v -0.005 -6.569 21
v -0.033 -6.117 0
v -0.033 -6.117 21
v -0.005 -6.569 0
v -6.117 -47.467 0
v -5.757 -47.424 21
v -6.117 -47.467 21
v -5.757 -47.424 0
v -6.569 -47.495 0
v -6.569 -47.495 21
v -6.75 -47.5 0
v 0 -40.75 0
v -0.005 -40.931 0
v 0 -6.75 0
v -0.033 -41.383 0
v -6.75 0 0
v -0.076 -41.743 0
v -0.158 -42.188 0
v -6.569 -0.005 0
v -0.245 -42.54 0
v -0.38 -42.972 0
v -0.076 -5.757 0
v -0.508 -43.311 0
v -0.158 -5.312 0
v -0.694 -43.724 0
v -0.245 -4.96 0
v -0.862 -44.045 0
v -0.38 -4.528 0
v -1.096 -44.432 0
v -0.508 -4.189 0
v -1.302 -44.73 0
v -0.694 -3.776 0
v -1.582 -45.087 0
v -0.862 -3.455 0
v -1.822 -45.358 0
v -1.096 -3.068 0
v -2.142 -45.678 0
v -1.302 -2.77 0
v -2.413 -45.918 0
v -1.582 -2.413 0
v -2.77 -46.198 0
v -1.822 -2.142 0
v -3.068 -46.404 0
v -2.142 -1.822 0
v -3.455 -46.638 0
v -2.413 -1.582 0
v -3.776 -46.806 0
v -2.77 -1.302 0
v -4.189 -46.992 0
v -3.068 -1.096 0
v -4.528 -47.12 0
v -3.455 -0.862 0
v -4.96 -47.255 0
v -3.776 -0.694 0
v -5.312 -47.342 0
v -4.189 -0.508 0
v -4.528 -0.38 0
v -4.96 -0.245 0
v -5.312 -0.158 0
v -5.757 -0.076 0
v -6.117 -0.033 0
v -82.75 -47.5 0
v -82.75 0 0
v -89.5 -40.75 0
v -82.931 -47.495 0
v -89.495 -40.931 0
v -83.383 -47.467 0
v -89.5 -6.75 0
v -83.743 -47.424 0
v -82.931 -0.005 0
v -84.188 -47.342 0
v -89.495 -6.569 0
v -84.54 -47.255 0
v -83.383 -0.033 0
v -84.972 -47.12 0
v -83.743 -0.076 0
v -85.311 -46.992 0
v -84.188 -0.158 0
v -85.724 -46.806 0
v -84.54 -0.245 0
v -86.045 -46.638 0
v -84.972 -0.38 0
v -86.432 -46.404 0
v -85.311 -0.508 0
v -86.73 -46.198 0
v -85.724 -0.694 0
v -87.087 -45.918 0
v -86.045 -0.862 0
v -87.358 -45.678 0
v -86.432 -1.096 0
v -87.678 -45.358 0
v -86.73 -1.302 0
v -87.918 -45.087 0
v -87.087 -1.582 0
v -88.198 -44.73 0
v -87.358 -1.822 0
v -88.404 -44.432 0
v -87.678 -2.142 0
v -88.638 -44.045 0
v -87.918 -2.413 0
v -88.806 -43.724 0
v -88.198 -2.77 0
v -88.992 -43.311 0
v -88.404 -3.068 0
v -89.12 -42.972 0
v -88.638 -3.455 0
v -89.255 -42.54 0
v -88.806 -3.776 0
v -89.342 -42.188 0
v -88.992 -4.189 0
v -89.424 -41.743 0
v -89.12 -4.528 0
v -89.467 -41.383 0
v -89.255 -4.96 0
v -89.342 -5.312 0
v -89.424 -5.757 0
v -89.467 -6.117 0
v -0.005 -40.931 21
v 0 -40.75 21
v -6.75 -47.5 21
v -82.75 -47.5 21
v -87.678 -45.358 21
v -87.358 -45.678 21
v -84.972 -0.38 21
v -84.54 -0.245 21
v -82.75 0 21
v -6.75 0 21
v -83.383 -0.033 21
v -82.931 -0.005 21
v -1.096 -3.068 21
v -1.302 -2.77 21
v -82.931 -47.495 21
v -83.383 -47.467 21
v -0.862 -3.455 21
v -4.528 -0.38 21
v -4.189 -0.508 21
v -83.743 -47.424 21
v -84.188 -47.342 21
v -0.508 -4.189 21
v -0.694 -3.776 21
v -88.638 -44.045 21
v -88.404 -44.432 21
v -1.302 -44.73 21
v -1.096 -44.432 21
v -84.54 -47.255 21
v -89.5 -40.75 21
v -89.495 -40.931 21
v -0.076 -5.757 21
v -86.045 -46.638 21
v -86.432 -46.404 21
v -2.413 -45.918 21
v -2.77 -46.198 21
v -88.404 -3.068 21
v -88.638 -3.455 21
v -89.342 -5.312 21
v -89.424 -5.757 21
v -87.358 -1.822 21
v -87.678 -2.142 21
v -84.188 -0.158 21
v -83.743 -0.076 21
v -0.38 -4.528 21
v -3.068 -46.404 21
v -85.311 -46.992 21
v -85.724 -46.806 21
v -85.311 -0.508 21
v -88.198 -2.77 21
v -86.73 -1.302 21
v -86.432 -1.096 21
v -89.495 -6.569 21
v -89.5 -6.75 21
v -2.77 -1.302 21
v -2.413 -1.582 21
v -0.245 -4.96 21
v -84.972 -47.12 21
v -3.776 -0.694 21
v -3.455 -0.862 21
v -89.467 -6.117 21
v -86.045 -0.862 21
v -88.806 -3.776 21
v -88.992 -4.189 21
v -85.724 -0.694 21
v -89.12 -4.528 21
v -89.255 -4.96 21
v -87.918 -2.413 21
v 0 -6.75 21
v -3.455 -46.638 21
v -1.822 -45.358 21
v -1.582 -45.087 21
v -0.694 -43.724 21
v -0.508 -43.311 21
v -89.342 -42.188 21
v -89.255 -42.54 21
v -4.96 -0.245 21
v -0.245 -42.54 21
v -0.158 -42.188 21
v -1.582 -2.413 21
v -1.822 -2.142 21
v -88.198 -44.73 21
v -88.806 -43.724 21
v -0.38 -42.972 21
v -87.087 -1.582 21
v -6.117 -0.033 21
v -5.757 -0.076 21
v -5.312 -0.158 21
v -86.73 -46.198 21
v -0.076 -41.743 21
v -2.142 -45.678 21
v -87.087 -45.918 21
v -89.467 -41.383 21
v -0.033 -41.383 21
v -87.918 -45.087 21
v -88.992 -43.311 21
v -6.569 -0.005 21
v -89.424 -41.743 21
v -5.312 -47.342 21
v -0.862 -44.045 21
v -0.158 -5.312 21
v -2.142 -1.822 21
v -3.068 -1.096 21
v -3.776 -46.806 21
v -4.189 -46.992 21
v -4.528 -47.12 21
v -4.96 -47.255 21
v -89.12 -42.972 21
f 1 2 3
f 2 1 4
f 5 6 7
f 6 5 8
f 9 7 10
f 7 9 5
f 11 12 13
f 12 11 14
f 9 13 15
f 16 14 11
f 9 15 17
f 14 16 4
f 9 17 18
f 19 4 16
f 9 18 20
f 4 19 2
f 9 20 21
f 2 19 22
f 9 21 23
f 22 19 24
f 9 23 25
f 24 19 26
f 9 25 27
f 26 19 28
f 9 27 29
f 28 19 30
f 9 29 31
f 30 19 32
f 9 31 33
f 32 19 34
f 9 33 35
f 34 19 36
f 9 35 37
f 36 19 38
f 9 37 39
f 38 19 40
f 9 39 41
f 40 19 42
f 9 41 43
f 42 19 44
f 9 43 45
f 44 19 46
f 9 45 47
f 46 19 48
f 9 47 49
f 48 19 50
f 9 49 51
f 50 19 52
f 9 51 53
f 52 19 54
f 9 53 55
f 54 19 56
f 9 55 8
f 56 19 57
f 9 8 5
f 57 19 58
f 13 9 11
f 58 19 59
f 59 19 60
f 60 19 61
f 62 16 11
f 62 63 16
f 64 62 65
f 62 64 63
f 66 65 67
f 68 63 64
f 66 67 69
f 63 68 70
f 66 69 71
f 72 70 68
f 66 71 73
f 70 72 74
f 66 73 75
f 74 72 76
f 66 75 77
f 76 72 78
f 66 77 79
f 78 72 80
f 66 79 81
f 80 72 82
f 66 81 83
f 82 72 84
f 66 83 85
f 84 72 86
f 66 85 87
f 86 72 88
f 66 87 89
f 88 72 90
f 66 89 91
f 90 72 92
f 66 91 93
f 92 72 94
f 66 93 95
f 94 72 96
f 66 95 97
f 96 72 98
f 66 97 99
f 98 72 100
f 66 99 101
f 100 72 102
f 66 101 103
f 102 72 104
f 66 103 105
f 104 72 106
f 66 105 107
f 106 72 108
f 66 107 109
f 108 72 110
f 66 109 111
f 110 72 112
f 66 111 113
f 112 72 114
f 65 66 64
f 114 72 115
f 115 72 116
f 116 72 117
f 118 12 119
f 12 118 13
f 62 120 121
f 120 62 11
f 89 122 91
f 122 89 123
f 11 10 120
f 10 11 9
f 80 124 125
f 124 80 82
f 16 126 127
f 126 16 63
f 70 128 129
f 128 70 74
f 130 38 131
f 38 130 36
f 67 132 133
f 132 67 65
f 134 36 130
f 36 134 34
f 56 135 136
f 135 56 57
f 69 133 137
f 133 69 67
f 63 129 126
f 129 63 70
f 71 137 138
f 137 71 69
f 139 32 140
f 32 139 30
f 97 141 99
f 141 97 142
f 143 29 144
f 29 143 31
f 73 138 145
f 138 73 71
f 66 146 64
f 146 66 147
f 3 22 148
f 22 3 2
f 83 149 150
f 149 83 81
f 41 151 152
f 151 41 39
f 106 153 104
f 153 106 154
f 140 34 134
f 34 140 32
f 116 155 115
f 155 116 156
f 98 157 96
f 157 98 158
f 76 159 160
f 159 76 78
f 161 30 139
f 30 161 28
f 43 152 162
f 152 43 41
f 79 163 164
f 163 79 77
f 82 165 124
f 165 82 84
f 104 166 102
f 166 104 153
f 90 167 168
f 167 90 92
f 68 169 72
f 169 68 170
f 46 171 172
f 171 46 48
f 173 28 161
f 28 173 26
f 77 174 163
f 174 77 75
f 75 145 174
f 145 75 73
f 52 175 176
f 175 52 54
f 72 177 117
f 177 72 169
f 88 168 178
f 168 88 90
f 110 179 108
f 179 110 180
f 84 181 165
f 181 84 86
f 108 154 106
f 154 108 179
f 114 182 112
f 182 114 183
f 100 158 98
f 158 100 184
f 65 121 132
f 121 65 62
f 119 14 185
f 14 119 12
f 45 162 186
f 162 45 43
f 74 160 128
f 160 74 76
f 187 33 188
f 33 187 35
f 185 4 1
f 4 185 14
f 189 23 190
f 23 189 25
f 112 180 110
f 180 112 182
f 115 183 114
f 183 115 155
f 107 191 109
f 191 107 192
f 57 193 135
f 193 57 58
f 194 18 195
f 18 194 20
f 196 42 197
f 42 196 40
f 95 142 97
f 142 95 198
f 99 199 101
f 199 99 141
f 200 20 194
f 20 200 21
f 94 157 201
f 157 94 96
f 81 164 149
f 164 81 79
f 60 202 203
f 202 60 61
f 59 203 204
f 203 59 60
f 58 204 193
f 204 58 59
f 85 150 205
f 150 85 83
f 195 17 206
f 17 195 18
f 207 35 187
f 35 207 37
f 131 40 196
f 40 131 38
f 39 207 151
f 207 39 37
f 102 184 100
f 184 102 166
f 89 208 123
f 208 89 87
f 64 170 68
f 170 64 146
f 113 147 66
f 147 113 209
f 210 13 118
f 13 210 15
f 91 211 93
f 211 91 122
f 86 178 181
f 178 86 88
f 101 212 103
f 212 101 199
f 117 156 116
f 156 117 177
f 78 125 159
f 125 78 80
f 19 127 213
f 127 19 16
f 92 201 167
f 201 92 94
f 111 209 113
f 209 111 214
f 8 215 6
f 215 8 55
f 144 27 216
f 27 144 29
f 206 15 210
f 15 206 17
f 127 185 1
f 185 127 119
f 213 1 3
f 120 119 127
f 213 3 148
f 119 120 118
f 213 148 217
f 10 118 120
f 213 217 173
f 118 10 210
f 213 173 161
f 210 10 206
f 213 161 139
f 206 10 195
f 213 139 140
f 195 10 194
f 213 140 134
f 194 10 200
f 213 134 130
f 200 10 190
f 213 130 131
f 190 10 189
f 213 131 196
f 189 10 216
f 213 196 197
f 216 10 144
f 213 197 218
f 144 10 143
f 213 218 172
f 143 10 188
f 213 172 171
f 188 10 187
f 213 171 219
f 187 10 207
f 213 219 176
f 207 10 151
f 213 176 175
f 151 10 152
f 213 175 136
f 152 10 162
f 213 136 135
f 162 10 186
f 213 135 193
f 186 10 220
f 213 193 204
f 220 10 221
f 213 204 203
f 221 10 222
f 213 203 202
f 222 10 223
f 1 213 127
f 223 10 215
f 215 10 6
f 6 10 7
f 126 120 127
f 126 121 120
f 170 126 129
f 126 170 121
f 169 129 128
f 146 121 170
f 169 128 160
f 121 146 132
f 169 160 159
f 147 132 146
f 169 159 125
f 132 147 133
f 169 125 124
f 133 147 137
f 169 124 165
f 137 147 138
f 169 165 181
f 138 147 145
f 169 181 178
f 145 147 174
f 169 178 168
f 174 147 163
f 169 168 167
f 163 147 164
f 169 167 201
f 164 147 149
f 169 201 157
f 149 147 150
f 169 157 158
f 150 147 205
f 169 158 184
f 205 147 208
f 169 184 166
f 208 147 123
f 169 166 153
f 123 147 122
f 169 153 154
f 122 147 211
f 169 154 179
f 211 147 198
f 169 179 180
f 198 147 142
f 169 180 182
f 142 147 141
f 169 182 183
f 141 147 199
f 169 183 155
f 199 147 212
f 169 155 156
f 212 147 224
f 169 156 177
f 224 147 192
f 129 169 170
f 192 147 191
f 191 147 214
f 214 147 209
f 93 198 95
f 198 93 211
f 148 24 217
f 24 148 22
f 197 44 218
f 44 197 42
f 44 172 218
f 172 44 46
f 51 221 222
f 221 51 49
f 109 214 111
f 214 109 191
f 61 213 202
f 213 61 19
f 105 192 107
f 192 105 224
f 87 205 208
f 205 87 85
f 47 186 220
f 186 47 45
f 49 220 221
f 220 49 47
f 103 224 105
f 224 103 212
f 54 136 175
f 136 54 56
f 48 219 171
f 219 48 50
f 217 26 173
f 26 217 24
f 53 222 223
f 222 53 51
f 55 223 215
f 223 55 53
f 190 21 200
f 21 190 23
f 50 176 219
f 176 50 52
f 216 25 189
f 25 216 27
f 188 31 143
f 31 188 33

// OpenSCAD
$fn = 50;

use <../scad_reference/gridfinity_tray_raw_offset_raw.scad>;

difference() {
	union() {
		gridfinity_tray_raw_offset_raw(clearance = [0.5, 0.5, 0], fa = 6, fn = 0, fs = 0.4, gridfinity_depth = 3, gridfinity_height = 1, gridfinity_width = 2, offset_radius = 3, pitch = [42, 42, 7], render_position = "center");
	}
	union();
}
